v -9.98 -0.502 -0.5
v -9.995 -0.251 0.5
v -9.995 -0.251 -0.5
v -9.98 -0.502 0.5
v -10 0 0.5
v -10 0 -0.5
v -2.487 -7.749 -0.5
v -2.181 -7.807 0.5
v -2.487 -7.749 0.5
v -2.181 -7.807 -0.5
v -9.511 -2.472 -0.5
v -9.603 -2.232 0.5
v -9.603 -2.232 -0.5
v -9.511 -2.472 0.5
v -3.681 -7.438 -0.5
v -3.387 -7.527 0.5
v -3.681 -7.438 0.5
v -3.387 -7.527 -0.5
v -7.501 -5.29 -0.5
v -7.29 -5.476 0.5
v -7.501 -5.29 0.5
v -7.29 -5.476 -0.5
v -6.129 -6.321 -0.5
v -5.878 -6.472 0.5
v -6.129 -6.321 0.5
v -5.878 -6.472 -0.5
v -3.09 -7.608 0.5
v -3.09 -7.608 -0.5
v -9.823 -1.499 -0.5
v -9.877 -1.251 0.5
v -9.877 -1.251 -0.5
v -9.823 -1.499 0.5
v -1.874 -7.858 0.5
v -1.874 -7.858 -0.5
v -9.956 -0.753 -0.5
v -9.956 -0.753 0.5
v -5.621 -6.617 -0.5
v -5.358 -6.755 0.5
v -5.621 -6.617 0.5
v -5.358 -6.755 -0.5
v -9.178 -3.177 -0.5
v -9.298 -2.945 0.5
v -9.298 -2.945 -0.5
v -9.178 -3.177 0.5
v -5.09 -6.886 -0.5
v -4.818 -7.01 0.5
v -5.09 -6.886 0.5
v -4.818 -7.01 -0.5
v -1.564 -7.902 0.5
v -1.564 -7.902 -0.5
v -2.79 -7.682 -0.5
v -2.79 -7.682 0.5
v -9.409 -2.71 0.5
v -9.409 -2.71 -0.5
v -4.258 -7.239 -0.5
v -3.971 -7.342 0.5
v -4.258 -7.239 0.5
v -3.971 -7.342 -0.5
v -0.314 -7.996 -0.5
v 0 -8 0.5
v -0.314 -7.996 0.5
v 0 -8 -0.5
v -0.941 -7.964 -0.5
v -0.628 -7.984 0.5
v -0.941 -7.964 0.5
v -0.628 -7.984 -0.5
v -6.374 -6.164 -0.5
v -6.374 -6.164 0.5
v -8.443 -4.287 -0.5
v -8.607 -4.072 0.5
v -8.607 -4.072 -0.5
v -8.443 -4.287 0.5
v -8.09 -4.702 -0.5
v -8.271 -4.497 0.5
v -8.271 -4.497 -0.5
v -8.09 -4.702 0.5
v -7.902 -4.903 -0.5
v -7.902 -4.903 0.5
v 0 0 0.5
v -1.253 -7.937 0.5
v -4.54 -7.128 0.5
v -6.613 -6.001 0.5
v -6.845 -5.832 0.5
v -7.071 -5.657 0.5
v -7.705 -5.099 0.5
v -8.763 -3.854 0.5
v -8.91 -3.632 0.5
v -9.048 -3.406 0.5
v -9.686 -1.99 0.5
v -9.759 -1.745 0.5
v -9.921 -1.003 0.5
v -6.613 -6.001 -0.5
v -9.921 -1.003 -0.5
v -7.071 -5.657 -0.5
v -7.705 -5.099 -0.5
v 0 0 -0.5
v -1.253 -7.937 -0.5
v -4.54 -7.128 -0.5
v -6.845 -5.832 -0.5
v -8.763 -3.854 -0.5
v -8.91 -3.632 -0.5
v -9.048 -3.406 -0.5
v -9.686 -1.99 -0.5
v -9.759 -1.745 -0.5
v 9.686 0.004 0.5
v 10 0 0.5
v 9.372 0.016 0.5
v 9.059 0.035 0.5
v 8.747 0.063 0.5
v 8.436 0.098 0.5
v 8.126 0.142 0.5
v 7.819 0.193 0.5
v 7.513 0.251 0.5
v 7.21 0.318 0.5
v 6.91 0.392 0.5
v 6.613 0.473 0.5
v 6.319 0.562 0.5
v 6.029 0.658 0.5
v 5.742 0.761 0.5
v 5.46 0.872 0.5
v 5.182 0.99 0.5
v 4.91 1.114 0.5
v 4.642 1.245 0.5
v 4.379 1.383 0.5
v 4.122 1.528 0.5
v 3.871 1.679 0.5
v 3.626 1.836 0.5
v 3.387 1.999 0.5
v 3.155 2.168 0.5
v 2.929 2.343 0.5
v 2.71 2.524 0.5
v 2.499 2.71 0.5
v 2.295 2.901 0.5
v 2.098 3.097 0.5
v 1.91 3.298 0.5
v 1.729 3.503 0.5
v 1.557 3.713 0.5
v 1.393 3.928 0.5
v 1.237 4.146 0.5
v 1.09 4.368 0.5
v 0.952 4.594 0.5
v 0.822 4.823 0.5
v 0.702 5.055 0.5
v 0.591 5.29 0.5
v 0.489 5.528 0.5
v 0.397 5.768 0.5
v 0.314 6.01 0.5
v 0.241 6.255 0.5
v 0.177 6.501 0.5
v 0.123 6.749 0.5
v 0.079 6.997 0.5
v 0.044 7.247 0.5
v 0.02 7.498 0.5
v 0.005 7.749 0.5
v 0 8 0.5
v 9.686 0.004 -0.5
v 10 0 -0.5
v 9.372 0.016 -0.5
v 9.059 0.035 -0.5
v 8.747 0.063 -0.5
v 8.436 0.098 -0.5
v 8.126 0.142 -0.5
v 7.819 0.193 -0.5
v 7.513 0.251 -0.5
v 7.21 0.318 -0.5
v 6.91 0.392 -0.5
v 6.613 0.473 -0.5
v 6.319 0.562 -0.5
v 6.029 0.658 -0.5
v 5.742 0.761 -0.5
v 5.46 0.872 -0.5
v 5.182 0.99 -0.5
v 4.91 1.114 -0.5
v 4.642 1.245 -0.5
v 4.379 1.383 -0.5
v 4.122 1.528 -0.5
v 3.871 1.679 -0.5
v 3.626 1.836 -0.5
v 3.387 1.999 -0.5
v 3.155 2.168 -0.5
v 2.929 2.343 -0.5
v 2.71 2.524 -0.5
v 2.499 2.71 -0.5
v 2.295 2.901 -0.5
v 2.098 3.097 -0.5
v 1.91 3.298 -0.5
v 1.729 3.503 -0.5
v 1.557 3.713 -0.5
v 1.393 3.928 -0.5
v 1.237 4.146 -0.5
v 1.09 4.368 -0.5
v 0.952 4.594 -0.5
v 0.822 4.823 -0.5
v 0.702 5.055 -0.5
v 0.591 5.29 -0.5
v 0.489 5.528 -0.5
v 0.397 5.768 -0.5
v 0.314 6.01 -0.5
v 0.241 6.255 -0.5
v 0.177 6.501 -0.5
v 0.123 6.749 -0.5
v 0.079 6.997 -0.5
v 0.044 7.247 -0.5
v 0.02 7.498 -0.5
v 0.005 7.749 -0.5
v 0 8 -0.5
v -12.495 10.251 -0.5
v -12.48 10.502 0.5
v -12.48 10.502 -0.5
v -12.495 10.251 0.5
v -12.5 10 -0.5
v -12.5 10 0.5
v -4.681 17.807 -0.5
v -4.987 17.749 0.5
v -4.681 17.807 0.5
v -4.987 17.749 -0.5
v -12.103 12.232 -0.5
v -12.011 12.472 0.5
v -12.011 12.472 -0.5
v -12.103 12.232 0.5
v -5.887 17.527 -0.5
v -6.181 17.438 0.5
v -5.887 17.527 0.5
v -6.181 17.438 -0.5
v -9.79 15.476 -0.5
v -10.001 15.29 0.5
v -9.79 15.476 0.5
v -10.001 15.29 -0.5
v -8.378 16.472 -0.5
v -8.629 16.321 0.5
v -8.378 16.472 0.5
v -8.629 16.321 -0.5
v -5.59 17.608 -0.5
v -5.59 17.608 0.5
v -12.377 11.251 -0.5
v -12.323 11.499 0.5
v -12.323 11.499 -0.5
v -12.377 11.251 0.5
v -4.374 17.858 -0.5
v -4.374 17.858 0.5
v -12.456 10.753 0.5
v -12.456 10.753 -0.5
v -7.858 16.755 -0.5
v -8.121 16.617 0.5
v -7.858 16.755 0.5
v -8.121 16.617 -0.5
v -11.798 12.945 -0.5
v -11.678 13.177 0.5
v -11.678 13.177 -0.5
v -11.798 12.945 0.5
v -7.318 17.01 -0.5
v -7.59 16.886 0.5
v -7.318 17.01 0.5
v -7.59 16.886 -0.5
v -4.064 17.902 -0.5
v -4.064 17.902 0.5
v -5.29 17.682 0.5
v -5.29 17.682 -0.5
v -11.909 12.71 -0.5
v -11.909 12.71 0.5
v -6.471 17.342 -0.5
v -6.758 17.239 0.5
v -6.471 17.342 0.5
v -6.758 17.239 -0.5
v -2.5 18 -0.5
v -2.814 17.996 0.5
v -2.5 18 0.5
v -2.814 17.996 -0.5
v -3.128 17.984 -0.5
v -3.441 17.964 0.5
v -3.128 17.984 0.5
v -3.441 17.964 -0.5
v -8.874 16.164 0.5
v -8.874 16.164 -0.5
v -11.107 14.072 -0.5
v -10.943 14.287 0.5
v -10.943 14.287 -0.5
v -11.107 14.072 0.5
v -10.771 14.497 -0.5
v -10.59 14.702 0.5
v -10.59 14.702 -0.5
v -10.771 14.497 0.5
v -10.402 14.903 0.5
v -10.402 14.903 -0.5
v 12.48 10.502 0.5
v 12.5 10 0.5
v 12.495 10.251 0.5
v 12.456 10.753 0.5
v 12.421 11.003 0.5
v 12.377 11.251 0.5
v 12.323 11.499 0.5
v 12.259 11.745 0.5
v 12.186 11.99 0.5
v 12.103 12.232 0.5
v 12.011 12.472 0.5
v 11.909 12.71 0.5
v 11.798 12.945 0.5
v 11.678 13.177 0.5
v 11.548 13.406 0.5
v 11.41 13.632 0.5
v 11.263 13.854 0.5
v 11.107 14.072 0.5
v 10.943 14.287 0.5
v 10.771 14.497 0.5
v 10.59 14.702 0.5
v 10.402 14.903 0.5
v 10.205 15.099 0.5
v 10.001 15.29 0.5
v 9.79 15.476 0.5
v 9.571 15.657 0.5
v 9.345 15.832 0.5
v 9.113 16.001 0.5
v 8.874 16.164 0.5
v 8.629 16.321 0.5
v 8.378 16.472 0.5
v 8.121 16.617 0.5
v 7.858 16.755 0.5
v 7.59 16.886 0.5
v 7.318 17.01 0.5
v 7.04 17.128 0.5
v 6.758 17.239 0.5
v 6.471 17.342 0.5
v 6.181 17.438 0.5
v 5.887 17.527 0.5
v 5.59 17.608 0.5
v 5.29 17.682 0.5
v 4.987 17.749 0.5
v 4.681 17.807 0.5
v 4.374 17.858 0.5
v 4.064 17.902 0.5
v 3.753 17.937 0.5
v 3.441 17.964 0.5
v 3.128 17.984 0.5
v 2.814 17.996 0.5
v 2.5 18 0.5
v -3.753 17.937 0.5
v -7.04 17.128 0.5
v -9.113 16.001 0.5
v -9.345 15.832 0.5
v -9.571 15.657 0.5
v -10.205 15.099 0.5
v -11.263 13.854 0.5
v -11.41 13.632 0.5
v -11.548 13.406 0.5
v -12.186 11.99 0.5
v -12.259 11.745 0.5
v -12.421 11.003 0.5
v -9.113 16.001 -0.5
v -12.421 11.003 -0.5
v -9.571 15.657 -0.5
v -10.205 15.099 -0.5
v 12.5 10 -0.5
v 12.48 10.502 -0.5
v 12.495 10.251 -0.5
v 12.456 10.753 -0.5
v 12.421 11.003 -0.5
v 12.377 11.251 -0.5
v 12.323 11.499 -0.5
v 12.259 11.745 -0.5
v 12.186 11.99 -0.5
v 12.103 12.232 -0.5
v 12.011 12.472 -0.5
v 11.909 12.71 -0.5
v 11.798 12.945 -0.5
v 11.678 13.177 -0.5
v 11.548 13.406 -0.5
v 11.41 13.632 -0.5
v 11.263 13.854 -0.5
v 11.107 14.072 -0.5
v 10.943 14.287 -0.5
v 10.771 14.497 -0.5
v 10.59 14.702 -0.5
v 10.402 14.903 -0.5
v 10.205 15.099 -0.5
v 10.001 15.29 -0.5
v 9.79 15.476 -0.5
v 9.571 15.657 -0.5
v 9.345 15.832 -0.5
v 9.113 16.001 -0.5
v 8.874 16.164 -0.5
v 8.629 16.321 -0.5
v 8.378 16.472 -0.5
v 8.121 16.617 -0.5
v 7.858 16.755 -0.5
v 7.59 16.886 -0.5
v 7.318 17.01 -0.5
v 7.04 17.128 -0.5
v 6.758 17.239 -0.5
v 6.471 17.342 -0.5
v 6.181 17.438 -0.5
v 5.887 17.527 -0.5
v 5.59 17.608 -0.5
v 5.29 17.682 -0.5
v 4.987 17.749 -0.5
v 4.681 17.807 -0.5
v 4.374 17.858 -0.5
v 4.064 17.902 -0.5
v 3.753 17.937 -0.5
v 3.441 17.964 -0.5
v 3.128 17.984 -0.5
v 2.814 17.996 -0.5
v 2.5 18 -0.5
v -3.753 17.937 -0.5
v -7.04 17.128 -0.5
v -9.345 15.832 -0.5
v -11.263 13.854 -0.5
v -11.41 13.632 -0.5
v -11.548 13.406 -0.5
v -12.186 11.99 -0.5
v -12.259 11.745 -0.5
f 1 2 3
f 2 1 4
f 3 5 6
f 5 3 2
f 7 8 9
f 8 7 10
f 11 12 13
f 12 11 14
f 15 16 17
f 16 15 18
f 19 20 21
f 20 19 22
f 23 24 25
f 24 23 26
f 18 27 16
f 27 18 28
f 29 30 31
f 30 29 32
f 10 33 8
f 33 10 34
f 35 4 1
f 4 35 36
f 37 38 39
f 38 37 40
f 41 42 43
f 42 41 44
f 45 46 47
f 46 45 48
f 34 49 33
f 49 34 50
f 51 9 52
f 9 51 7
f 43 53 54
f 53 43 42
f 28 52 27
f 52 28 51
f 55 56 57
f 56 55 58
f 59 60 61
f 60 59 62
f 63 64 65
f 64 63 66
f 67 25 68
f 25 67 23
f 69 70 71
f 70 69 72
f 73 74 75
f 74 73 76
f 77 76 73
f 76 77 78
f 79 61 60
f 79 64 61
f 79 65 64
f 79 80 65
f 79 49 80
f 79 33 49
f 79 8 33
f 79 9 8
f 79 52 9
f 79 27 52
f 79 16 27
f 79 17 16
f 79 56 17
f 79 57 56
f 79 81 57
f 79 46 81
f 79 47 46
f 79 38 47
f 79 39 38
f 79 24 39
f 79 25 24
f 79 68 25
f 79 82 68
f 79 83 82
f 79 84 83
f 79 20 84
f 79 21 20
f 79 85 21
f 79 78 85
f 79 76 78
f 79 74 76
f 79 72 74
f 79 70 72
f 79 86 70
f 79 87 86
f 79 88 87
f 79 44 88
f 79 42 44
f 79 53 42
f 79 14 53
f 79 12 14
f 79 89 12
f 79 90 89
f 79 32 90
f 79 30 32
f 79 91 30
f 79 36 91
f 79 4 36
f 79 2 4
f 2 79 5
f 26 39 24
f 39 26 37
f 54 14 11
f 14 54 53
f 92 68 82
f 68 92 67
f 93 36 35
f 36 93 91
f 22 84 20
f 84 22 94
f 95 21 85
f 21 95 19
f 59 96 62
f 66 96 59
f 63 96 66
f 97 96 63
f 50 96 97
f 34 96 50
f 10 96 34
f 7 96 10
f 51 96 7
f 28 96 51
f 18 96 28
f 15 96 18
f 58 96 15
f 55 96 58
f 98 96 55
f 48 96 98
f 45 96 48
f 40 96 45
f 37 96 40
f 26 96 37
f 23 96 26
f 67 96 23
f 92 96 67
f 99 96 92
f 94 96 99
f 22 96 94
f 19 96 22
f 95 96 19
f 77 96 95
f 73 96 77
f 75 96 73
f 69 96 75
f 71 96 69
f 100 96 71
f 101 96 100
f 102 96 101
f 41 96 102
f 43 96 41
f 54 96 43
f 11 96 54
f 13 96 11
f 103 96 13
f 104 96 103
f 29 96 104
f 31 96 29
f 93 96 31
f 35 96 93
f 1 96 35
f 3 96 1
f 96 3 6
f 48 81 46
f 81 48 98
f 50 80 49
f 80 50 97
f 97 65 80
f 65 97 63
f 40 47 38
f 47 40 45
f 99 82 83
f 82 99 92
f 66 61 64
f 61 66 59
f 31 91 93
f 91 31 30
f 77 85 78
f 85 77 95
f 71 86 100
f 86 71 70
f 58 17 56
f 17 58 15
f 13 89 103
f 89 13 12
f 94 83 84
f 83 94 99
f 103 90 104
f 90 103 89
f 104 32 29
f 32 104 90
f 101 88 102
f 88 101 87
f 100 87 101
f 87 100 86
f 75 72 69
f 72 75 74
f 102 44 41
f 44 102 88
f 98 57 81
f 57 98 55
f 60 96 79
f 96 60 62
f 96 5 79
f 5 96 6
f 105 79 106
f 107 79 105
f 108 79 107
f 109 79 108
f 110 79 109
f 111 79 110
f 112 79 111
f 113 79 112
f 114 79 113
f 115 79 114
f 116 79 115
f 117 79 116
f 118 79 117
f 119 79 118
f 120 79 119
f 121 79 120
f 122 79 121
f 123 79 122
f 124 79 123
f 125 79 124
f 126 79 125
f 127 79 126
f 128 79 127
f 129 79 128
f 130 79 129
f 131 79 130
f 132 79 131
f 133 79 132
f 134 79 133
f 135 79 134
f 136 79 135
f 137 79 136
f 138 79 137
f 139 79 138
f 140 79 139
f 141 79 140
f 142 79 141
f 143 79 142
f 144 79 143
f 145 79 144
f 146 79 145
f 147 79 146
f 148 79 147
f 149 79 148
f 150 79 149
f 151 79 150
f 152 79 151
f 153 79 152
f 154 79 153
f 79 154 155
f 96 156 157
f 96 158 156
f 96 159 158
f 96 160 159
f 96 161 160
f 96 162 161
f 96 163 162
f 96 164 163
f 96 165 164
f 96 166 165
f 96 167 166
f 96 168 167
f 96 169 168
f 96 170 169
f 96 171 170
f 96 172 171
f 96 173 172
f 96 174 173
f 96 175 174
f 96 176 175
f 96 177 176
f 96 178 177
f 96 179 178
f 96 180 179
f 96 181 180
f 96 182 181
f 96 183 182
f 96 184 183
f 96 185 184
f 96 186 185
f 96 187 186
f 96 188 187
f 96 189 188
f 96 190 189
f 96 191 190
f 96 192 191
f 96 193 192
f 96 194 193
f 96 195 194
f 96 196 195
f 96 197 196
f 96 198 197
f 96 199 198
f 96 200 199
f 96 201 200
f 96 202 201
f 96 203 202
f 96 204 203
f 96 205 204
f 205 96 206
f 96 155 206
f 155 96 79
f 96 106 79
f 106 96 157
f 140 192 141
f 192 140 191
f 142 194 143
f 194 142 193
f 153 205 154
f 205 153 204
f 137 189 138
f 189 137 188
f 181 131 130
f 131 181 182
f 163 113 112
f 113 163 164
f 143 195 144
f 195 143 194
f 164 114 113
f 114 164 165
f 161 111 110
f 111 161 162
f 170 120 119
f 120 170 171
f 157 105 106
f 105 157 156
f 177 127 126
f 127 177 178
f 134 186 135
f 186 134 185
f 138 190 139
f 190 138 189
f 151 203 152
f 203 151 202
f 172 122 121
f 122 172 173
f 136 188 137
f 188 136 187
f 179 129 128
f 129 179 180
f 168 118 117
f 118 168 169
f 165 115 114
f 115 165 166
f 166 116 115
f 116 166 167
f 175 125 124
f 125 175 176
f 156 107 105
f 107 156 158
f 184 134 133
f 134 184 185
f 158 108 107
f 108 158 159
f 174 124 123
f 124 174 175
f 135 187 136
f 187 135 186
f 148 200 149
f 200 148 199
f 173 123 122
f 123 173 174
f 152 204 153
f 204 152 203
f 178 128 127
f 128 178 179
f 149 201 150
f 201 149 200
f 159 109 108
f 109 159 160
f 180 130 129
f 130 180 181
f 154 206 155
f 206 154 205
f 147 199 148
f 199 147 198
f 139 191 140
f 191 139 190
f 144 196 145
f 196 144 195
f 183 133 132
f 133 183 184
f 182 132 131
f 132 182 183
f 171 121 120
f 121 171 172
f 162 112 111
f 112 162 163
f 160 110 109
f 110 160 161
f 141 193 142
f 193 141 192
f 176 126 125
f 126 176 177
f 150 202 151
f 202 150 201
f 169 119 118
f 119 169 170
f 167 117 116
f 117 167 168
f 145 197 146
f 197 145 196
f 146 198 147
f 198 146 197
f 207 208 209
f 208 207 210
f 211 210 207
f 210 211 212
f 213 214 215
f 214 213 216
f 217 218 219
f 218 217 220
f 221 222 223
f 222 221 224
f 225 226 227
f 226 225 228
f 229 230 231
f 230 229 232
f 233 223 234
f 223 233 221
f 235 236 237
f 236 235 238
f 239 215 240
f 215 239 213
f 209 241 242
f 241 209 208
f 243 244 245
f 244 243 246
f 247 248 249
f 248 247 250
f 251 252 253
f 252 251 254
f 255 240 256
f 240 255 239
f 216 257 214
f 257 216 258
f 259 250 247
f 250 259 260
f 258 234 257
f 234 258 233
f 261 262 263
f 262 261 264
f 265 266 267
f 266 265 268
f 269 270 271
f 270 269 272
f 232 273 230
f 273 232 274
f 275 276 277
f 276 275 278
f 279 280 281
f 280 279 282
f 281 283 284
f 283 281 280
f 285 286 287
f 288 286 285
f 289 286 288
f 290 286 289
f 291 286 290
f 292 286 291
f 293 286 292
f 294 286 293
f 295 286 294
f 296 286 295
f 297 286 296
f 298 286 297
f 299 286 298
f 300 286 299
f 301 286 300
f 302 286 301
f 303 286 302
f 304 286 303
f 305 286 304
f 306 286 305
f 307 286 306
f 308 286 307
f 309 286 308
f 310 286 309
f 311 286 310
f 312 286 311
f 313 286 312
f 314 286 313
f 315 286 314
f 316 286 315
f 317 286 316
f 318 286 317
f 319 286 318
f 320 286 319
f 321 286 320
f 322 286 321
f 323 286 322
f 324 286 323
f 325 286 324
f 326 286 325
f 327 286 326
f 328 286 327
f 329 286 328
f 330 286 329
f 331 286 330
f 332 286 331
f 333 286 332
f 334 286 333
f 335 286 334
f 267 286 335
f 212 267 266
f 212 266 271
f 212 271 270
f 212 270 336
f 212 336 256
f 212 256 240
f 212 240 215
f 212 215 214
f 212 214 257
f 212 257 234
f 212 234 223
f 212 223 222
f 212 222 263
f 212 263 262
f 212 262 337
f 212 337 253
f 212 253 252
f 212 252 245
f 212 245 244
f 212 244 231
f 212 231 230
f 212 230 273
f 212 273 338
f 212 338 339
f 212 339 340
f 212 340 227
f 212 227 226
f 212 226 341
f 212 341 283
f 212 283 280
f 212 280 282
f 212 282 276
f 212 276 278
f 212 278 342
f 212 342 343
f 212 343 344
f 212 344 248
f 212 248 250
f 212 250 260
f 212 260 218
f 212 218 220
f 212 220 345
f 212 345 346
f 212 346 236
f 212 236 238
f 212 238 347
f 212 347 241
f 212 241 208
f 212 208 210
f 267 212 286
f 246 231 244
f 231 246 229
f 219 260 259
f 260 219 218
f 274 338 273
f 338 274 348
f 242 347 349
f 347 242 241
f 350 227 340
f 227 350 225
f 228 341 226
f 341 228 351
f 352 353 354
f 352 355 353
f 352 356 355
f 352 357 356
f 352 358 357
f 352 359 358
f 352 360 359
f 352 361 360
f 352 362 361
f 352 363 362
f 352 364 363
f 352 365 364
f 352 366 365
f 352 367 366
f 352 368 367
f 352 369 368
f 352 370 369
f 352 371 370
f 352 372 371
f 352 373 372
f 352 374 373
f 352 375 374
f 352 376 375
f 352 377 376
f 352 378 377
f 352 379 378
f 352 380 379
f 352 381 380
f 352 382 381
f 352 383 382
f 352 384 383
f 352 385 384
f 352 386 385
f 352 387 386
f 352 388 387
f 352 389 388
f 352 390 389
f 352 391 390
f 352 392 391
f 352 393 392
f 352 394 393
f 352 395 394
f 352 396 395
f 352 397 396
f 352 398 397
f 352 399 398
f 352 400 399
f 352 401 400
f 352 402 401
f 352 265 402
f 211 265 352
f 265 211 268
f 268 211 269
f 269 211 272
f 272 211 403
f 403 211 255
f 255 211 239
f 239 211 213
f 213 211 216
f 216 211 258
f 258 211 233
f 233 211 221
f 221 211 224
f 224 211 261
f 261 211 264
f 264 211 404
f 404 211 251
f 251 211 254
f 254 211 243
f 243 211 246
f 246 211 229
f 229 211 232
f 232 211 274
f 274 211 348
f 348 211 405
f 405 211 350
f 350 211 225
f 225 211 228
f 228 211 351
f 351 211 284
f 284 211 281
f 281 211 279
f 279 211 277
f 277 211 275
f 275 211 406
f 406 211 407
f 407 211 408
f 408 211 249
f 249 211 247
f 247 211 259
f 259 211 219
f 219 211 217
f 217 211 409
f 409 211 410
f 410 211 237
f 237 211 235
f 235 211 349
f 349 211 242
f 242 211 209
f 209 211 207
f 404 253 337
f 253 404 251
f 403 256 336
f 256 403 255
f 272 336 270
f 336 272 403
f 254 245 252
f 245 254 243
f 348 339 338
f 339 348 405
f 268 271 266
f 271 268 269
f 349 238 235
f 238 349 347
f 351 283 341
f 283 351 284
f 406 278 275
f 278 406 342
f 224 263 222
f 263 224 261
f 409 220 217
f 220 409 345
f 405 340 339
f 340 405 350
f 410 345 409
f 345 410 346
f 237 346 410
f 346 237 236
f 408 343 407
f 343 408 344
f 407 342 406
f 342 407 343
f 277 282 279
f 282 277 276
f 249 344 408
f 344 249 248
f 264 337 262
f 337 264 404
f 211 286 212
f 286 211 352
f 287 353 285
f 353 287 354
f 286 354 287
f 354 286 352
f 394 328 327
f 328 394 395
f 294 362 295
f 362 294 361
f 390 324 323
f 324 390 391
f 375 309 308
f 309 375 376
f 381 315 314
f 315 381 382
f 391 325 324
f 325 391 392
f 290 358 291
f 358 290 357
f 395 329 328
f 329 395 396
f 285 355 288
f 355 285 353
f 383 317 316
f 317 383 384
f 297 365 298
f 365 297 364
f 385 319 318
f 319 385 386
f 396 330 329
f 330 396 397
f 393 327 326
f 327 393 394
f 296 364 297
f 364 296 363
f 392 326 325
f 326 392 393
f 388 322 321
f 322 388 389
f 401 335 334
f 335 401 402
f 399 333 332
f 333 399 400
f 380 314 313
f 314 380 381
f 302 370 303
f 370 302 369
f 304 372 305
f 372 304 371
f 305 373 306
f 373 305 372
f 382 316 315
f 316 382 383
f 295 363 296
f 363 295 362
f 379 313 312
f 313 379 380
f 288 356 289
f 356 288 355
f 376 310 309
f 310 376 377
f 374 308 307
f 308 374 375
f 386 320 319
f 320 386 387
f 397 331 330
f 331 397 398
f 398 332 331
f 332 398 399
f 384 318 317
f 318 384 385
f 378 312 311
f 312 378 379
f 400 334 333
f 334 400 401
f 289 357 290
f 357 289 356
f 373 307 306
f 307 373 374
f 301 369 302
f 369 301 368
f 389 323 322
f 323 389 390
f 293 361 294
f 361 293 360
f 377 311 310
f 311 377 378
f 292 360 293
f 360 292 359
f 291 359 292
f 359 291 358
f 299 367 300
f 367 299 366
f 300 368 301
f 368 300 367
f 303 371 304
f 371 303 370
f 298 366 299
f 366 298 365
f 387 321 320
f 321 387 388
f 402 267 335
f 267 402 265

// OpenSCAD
$fn = 200;
nothing = 0.05;

/**
 * @brief Draws a round corner in the XY plane.
 */
module round_corner_outside(x=1, y=1, z=1)
{
    scale([x, y, 1])
    translate([0, 0, -z/2])
    intersection()
    {
        // full circle
        linear_extrude(z)
        circle(1);

        // x >= 0; y >= 0;
        cube([x, y, z]);
    }
}

/**
 * @brief Draws a round corner in the XY plane.
 */
module round_corner_inside(x=1, y=1, z=1)
{
    scale([x, y, z])
    translate([0, 0, -1/2])
    difference()
    {
        // x >= 0; y >= 0;
        cube([1, 1, 1]);

        translate([1, 1, -nothing/2])
        linear_extrude(1 + nothing)
        circle(1);
    }
}

/**
 * @brief Draws a round end/tip
 * @param x Total width
 * @param y Total height
 * @param z Material thickness
 * @param d Length of flat middle part
 */
module round_tip(x=1, y=1, z=1, d=0)
{
    // width of the rounded corners
    e = (x-d)/2;

    // left corner
    translate([-d/2, 0, 0])
    mirror()
    round_corner_outside(e, y, z);

    // right corner
    translate([+d/2, 0, 0])
    round_corner_outside(e, y, z);

    // flat middle part
    translate([0, y/2, 0])
    cube([d, y, z], center=true);
}

rotate(180)
round_corner_outside(10, 8, 1);

round_corner_inside(10, 8, 1);

translate([0, 10, 0])
round_tip(25, 8, 1, 5);
